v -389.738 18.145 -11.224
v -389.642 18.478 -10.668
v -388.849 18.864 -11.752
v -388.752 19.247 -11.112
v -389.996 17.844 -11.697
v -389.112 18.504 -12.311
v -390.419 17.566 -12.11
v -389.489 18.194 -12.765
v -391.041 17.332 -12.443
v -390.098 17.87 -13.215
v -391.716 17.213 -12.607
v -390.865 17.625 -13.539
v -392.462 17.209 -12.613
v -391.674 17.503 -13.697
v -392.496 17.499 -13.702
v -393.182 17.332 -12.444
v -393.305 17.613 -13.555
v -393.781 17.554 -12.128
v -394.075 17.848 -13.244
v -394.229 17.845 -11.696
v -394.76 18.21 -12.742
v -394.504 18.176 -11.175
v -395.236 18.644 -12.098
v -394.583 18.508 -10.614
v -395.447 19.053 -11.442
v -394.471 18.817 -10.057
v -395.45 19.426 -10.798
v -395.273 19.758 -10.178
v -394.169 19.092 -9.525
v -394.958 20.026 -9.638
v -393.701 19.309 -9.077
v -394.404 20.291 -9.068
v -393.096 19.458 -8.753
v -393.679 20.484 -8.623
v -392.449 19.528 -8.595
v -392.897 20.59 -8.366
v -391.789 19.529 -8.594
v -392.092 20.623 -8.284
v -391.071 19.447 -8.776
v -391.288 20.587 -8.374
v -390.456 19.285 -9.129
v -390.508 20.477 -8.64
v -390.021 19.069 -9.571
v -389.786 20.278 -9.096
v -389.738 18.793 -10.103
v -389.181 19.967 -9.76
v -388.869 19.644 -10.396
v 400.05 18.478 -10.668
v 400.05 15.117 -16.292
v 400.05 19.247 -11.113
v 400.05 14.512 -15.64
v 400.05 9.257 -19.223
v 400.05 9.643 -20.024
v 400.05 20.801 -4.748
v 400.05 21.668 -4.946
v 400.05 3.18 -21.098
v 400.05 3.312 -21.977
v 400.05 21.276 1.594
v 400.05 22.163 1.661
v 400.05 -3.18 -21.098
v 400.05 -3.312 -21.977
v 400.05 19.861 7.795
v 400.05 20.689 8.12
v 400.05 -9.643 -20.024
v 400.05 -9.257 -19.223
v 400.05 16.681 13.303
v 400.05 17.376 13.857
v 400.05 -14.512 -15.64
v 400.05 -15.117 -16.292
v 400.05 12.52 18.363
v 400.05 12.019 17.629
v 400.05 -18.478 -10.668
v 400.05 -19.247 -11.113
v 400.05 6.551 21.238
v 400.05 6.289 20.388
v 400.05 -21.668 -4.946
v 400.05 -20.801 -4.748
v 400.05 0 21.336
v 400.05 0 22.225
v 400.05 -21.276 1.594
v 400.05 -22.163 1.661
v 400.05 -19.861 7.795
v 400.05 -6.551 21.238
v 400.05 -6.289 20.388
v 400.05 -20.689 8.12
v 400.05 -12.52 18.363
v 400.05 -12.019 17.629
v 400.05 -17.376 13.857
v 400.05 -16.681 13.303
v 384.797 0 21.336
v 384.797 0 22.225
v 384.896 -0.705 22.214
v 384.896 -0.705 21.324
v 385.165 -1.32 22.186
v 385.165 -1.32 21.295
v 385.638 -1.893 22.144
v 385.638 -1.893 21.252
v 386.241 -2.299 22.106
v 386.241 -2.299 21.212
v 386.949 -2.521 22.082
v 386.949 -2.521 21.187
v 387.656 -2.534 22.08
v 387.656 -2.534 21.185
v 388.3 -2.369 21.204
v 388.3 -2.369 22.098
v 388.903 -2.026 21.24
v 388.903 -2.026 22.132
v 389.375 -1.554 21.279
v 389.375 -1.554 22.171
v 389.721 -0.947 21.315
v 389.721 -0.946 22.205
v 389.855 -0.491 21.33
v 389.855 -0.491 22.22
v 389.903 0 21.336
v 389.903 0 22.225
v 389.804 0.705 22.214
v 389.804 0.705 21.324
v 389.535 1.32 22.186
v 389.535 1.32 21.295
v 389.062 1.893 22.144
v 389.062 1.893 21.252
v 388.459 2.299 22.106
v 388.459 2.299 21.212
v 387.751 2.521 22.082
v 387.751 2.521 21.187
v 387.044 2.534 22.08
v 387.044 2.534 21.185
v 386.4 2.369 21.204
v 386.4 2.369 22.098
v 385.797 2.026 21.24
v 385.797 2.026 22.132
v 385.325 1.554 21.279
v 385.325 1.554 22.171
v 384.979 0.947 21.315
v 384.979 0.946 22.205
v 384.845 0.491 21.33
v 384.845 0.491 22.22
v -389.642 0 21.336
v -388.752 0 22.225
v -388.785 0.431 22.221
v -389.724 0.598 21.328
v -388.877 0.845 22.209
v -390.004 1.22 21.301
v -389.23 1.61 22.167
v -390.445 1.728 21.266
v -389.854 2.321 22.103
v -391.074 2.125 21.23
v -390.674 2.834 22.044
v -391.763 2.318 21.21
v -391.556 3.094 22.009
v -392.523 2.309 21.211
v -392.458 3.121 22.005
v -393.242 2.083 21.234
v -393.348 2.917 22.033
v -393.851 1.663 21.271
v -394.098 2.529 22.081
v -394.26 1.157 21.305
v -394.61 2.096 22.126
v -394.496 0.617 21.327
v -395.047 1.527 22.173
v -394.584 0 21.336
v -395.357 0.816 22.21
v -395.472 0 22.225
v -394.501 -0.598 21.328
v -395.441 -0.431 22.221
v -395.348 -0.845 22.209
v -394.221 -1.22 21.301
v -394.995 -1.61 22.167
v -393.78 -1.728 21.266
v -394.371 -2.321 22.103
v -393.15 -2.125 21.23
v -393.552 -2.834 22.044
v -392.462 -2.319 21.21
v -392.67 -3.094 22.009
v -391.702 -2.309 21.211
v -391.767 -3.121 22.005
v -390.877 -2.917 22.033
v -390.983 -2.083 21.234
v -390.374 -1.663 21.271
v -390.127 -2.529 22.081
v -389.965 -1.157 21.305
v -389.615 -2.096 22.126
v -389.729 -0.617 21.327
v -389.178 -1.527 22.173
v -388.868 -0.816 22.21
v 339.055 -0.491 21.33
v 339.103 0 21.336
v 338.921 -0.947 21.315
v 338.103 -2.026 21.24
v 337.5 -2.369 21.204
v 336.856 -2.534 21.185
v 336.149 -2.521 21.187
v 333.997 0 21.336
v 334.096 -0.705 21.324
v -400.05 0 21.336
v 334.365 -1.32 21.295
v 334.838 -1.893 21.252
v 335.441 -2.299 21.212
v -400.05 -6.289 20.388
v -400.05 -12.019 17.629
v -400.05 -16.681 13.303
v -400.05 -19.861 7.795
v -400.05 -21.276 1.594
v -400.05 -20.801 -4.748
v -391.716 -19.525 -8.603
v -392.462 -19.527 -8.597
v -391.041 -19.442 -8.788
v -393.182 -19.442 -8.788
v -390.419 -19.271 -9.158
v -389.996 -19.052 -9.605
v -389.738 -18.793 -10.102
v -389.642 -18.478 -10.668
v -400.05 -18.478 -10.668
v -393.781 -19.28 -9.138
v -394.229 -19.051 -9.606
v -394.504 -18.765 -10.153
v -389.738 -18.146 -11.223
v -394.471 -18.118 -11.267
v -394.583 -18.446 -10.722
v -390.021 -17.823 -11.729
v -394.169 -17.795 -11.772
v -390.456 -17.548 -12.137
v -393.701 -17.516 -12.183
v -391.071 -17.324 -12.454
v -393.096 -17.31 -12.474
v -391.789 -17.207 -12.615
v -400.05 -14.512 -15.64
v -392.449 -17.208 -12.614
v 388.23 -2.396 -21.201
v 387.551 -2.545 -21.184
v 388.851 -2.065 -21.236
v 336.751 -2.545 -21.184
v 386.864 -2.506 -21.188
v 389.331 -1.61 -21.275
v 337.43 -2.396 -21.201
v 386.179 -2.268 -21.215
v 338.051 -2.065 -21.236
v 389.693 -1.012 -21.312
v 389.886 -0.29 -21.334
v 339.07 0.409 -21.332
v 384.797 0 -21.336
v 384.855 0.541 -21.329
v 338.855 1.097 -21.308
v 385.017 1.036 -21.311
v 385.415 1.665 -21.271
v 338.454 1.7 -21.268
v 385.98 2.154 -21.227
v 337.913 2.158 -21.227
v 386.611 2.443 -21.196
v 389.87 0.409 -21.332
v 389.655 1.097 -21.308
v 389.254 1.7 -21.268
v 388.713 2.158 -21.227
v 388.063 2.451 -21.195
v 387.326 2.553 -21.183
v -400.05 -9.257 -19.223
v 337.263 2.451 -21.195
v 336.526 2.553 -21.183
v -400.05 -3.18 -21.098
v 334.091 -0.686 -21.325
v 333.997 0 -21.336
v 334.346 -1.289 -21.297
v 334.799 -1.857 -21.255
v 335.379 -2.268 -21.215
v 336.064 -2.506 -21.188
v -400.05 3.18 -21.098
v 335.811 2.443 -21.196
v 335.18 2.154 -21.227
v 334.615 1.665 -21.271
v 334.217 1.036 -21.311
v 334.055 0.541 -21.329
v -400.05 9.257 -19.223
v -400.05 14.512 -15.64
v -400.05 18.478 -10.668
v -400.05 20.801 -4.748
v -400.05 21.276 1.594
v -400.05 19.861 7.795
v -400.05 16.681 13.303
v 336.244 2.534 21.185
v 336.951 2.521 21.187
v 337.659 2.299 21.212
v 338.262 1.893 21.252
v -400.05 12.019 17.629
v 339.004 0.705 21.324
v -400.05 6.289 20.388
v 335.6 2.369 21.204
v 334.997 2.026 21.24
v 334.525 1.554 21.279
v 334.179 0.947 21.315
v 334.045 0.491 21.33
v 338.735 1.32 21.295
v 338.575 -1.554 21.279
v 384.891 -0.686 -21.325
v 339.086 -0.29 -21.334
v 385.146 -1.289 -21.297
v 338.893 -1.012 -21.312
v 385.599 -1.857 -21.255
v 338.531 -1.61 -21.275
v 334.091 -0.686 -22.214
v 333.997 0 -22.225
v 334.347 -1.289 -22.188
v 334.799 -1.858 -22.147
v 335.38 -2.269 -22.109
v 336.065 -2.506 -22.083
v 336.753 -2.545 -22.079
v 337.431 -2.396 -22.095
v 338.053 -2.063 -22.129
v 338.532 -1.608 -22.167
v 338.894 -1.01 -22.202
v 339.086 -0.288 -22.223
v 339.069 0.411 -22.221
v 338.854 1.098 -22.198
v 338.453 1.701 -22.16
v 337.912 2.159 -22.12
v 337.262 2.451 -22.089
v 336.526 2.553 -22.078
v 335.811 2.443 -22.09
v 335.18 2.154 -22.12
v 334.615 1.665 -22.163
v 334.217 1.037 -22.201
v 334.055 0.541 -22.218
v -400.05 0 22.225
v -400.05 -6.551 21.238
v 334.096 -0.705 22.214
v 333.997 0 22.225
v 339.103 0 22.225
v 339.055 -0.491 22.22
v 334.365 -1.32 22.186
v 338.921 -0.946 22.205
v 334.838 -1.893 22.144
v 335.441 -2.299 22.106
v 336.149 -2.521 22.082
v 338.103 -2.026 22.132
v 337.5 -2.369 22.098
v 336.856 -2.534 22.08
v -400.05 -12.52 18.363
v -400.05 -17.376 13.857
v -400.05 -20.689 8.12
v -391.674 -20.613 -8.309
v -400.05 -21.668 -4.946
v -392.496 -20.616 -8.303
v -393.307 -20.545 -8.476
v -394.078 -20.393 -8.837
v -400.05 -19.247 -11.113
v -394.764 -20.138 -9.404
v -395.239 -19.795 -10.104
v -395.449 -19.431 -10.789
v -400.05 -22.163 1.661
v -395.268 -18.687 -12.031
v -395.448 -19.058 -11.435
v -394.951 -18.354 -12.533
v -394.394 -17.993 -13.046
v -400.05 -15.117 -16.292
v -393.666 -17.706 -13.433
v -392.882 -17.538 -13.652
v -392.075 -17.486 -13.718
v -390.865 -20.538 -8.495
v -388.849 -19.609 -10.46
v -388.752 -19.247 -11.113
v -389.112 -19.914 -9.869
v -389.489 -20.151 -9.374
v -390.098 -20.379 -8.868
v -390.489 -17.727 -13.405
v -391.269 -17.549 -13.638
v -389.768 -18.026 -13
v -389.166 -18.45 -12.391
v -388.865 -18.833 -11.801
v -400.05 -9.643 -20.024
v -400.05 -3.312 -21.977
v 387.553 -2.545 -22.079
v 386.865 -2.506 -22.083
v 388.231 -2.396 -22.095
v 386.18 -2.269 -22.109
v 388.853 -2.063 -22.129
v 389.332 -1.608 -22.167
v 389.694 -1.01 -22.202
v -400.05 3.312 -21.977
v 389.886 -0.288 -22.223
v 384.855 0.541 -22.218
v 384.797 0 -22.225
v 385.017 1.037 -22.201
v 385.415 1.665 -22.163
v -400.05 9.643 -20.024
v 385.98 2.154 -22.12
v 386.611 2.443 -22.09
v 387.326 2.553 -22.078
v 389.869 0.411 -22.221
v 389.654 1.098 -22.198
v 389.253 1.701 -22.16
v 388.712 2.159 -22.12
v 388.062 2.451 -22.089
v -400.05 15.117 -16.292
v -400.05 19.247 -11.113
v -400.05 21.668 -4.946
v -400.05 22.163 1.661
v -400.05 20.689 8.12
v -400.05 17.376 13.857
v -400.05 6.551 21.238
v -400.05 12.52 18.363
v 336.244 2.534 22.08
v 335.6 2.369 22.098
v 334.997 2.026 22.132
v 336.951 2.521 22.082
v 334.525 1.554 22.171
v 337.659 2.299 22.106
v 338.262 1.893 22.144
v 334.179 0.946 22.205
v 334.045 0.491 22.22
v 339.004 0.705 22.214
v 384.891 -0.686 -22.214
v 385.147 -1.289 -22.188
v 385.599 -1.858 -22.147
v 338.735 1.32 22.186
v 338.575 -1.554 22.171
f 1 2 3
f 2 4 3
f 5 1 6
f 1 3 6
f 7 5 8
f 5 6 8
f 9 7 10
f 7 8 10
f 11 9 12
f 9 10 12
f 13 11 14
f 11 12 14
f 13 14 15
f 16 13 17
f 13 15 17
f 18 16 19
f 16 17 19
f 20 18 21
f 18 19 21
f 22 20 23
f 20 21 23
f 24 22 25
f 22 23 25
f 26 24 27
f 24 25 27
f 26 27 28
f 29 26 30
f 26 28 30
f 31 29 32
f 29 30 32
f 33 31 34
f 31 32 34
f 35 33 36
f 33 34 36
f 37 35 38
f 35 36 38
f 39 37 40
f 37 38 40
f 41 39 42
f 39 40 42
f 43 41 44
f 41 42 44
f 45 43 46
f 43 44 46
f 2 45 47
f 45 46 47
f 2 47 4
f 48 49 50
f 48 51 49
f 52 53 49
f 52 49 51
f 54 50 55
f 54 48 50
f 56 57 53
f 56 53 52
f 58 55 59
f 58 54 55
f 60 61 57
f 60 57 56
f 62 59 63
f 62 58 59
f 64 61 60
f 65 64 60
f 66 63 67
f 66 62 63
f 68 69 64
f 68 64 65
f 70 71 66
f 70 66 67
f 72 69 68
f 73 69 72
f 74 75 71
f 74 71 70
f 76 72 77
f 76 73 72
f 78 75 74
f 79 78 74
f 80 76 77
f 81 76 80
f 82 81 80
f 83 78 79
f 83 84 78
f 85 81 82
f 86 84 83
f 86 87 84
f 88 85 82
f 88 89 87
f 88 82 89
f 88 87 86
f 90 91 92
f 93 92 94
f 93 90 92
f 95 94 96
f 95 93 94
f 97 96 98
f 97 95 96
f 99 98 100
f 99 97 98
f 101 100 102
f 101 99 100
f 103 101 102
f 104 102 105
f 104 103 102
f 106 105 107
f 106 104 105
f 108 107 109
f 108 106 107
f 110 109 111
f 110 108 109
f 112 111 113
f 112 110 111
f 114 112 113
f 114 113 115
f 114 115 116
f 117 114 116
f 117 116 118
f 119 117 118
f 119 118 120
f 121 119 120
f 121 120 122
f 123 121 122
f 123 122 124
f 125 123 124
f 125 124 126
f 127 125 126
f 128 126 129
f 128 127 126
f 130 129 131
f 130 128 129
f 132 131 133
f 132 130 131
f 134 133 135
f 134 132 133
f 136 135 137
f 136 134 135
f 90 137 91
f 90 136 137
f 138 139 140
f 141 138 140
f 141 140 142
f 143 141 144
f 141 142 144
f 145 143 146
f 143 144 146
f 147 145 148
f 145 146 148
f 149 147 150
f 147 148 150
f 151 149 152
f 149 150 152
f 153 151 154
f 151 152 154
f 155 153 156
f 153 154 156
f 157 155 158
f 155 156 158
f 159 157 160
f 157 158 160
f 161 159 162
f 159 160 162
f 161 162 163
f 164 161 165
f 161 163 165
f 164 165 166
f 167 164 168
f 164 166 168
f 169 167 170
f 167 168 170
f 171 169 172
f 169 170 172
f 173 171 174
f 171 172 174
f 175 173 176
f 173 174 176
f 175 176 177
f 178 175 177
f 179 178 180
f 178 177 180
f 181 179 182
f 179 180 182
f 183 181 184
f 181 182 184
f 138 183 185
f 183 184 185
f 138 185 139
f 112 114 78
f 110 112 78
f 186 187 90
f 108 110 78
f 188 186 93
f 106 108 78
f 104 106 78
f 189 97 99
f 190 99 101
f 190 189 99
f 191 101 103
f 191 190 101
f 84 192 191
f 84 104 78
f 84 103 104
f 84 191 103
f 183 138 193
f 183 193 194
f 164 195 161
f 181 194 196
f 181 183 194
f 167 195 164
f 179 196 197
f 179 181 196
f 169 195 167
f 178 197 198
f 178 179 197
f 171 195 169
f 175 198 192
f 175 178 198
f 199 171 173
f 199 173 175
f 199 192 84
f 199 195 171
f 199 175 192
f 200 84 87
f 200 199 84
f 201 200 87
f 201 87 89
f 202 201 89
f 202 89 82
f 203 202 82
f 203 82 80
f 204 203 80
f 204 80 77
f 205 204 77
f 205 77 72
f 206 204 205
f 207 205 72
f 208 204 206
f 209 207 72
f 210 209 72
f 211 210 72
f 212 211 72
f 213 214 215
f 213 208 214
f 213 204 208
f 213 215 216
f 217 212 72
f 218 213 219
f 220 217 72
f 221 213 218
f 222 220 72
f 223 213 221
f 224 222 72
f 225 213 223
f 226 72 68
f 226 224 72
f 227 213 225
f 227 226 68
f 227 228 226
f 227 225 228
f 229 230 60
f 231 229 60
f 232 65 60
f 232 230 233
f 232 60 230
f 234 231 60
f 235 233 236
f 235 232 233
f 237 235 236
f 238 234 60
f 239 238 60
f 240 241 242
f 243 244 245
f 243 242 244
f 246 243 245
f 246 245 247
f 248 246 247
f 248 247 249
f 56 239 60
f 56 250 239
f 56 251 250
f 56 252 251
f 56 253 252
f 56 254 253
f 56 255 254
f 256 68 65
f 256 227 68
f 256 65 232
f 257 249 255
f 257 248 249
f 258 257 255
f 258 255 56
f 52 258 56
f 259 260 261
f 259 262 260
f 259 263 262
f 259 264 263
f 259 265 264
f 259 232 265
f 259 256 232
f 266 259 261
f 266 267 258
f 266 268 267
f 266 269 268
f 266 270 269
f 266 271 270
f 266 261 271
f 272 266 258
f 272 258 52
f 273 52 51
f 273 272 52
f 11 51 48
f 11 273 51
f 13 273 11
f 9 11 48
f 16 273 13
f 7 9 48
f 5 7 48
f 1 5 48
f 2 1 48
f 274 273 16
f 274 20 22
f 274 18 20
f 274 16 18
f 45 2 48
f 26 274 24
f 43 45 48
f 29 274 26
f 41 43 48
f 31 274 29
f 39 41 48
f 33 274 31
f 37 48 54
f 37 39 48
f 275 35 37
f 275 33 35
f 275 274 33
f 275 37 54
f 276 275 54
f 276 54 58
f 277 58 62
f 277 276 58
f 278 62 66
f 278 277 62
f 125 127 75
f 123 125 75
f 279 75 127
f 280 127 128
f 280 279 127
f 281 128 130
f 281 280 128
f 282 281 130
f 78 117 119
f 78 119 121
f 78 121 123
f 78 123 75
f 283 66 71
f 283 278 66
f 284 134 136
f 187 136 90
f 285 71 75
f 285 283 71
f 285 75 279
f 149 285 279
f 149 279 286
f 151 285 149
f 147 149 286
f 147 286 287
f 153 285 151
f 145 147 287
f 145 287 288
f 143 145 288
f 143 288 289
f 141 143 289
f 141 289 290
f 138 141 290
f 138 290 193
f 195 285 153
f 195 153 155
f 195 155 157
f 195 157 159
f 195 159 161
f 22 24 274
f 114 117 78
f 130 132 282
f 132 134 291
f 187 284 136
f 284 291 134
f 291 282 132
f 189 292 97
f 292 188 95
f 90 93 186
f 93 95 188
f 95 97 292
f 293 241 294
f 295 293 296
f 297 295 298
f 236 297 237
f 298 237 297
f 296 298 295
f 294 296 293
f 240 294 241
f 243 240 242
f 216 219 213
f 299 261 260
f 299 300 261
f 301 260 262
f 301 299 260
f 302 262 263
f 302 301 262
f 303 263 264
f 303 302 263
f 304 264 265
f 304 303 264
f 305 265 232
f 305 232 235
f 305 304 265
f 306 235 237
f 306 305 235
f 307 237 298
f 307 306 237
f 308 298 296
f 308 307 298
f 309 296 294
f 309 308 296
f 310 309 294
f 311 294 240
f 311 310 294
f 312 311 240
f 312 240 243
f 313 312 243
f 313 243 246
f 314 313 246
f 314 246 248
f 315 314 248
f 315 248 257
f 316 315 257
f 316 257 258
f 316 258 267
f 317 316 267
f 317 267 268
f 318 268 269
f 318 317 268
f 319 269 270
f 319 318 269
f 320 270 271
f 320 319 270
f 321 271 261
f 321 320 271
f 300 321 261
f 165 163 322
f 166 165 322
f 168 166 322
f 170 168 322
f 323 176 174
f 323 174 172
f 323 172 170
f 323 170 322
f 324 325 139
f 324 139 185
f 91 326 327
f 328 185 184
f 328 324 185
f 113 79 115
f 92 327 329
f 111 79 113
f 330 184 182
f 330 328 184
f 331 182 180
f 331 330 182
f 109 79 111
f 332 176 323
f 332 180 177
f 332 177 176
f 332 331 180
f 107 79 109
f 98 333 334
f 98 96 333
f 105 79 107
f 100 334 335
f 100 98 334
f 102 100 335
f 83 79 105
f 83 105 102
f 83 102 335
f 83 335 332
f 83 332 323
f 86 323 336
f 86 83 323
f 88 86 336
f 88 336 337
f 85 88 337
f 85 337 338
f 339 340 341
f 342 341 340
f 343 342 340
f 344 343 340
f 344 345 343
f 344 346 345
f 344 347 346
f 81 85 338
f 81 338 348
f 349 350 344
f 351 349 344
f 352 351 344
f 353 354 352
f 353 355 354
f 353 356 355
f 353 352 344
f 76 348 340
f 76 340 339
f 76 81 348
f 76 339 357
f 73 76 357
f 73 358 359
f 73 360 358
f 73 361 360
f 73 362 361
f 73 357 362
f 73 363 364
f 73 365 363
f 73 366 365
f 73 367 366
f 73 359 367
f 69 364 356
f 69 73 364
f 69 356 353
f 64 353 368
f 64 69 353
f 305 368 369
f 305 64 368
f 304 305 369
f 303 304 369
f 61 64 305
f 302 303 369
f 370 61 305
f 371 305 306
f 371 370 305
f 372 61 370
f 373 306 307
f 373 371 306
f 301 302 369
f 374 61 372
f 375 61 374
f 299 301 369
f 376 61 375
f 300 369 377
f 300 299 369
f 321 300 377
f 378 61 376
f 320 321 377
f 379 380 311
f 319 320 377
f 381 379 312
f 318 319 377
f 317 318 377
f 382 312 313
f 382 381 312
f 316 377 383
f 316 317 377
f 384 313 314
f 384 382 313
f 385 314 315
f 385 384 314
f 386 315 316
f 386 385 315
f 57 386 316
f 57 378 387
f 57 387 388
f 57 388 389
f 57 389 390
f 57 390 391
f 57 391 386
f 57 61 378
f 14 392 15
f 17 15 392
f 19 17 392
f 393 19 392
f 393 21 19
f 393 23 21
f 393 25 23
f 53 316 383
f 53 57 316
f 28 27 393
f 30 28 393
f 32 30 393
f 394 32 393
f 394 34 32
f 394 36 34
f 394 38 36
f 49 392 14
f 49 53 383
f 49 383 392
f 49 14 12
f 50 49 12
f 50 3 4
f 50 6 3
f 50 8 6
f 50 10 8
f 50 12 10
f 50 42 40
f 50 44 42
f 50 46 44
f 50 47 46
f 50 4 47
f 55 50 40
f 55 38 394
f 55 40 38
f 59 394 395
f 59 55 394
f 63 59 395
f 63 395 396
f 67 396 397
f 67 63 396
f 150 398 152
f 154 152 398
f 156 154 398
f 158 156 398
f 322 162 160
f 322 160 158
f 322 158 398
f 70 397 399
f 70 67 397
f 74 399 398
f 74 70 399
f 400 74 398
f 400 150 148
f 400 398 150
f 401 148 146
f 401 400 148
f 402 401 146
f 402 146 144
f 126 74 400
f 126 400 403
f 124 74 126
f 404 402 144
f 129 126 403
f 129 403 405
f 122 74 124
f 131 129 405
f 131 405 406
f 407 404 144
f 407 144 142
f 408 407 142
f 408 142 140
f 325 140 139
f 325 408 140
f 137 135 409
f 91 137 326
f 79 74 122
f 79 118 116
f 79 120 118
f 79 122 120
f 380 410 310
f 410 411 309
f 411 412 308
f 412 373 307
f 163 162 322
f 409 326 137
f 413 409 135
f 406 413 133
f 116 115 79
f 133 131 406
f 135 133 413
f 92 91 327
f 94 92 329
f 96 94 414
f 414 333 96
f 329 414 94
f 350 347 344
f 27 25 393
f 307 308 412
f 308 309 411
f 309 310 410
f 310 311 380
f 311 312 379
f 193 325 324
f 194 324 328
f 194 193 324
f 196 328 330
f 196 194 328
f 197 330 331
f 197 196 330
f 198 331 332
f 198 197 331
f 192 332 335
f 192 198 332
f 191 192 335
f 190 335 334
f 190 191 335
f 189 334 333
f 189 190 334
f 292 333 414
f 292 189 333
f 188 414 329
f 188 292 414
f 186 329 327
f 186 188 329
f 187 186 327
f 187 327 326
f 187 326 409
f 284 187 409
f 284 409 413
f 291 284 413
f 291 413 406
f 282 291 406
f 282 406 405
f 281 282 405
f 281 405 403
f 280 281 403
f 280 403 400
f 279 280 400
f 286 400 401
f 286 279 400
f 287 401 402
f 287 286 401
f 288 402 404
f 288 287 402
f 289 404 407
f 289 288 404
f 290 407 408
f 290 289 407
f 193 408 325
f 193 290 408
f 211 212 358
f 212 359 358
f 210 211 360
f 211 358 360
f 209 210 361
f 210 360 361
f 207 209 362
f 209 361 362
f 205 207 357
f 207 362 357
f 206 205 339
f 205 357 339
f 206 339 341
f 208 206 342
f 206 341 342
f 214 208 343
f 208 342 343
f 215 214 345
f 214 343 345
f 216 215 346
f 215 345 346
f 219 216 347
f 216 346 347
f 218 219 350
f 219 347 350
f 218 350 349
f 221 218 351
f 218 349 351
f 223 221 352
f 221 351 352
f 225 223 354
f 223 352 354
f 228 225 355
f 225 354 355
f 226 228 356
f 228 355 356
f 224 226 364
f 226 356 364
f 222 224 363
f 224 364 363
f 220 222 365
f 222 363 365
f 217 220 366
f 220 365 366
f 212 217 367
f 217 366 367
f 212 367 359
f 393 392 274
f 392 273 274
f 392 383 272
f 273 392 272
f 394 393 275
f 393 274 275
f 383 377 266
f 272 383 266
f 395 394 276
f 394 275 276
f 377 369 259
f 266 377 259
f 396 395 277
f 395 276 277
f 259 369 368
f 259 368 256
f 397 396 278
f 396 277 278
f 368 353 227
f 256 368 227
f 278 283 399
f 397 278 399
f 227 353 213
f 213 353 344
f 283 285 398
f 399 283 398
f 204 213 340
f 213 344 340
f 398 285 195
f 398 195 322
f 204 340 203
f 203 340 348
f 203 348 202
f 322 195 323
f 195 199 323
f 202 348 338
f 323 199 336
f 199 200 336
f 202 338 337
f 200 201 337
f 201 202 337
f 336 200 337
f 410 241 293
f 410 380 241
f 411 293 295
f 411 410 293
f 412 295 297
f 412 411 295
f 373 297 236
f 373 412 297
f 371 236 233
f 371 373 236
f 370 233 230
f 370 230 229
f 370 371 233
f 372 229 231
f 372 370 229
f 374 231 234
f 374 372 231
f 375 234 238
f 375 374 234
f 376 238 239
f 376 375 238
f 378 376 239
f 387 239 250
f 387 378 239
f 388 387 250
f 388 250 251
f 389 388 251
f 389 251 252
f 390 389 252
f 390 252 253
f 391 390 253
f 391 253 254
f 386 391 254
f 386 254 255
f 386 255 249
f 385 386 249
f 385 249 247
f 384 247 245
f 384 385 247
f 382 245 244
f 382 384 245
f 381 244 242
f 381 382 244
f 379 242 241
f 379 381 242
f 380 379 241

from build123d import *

# Parameters (mm, degrees)
SKETCH3_R               = 22.225
SKETCH3_R_2             = 21.336
BOSS_EXTRUDE1_DEPTH     = 400.05
CUT_EXTRUDE1_DEPTH      = 402.282822645
CUT_EXTRUDE1_DEPTH_BACK = 402.282822645
SKETCH4_R               = 2.5527
CIRPATTERN1_COUNT       = 3


# Read off the part's stored shape, not the designer's step: CSK for M3 SFHCS1
with BuildPart() as part:
    # Sketch3 → Boss-Extrude1 (new, symmetric)
    with BuildSketch(Plane(origin=(0, 0, 0), x_dir=(0, 0, -1), z_dir=(1, 0, 0))):
        with Locations(Location((0, 0, 0), (0, 0, 180))):
            Circle(SKETCH3_R)
        with Locations(Location((0, 0, 0), (0, 0, 180))):
            Circle(SKETCH3_R_2, mode=Mode.SUBTRACT)
    extrude(amount=BOSS_EXTRUDE1_DEPTH, both=True)

    # Sketch4 → Cut-Extrude1 (cut, two sides: drawn at the far end of the back side and taken through both)
    with BuildSketch(Plane.XY.offset(-CUT_EXTRUDE1_DEPTH_BACK)):
        with Locations(Location((336.55, 0, 0), (0, 0, 180))):
            Circle(SKETCH4_R)
        with Locations(Location((387.35, 0, 0), (0, 0, 180))):
            Circle(SKETCH4_R)
    extrude(amount=CUT_EXTRUDE1_DEPTH + CUT_EXTRUDE1_DEPTH_BACK, mode=Mode.SUBTRACT)

    # CSK for M3 SFHCS1 outline → CSK for M3 SFHCS1 (revolve, cut)
    with BuildSketch(Plane(origin=(-392.1125, 0, 0), x_dir=(1, 0, 0), z_dir=(0, -1, 0))):
        Polygon((3.360105502, 22.225105502), (0, 22.225105502), (0, 21.206997784), (2.341997784, 21.206997784), align=None)
    csk_for_m3_sfhcs1 = revolve(axis=Axis((-392.1125, 0, 0), (0, 0, 1)), mode=Mode.SUBTRACT)

    # CirPattern1: CSK for M3 SFHCS1 ×3 about axis
    cirpattern1_axis = Axis((400.05, 0, 0), (-1, 0, 0))
    for i in range(1, CIRPATTERN1_COUNT):
        add(csk_for_m3_sfhcs1.rotate(cirpattern1_axis, i * 360 / CIRPATTERN1_COUNT), mode=Mode.SUBTRACT)


solid = part.part
